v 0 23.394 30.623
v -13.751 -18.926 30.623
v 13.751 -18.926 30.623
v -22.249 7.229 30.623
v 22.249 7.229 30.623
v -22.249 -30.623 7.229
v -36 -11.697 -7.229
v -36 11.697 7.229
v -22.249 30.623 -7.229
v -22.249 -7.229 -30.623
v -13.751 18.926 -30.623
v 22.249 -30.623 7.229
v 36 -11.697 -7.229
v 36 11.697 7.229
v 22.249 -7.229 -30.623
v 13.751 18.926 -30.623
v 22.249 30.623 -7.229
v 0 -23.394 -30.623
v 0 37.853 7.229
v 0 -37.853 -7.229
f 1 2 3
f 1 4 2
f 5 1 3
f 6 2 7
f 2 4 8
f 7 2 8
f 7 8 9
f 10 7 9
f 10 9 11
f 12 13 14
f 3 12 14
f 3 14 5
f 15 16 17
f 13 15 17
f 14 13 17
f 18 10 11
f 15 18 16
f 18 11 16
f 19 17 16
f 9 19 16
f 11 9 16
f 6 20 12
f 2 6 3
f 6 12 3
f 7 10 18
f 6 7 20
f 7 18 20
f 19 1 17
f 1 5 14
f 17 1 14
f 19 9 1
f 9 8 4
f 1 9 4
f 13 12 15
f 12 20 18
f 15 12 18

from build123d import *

# Parameters (mm, degrees)
F1_DEPTH  = 30.6234291007
F13_DEPTH = 50
F14_DEPTH = 500
F15_DEPTH = 500
F16_DEPTH = 500
F17_DEPTH = 500
F24_DEPTH = 500
F25_DEPTH = 500
F26_DEPTH = 500
F27_DEPTH = 500
F28_DEPTH = 500


with BuildPart() as f1:
    # F0 (on Top) → F1 (new body, symmetric)
    with BuildSketch(Plane.XY):
        Polygon((-36, 11.6971090644), (-36, -11.6971090644), (-22.249223595, -30.6234291007), (0, -37.8526400726), (22.249223595, -30.6234291007), (36, -11.6971090644), (36, 11.6971090644), (22.249223595, 30.6234291007), (0, 37.8526400726), (-22.249223595, 30.6234291007), align=None)
    extrude(amount=F1_DEPTH, both=True)

    # F3 (on Right) → F13 (cut, symmetric)
    with BuildSketch(Plane.YZ):
        Polygon((-37.8526400726, -7.2292109719), (-18.9263200363, 30.6234291007), (-37.8526400726, 30.6234291007), align=None)
    extrude(amount=F13_DEPTH, both=True, mode=Mode.SUBTRACT)

    # F6 (on face) → F14 (cut, symmetric)
    with BuildSketch(Plane(origin=(0, 0, 0), x_dir=(-0.9510565163, 0.3090169944, 0), z_dir=(0.3090169944, 0.9510565163, 0))):
        Polygon((-37.8526400726, -7.2292109719), (-18.9263200363, 30.6234291007), (-37.8526400726, 30.6234291007), align=None)
    extrude(amount=F14_DEPTH, both=True, mode=Mode.SUBTRACT)

    # F8 (on face) → F15 (cut, symmetric)
    with BuildSketch(Plane(origin=(0, 0, 0), x_dir=(0.5877852523, 0.8090169944, 0), z_dir=(0.8090169944, -0.5877852523, 0))):
        Polygon((37.8526400726, -7.2292109719), (37.8526400726, 30.6234291007), (18.9263200363, 30.6234291007), align=None)
    extrude(amount=F15_DEPTH, both=True, mode=Mode.SUBTRACT)

    # F10 (on face) → F16 (cut, symmetric)
    with BuildSketch(Plane(origin=(0, 0, 0), x_dir=(0.5877852523, -0.8090169944, 0), z_dir=(-0.8090169944, -0.5877852523, 0))):
        Polygon((-18.9263200363, 30.6234291007), (-37.8526400726, 30.6234291007), (-37.8526400726, -7.2292109719), align=None)
    extrude(amount=F16_DEPTH, both=True, mode=Mode.SUBTRACT)

    # F12 (on face) → F17 (cut, symmetric)
    with BuildSketch(Plane(origin=(0, 0, 0), x_dir=(-0.9510565163, -0.3090169944, 0), z_dir=(-0.3090169944, 0.9510565163, 0))):
        Polygon((37.8526400726, 26.069773404), (37.8526400726, 30.6234291007), (18.9263200363, 30.6234291007), (37.8526400726, -7.2292109719), align=None)
    extrude(amount=F17_DEPTH, both=True, mode=Mode.SUBTRACT)

    # F19 (on Right) → F24 (cut, symmetric)
    with BuildSketch(Plane.YZ):
        Polygon((37.8526400726, 7.2292109719), (18.9263200363, -30.6234291007), (37.8526400726, -30.6234291007), align=None)
    extrude(amount=F24_DEPTH, both=True, mode=Mode.SUBTRACT)

    # F20 (on face) → F25 (cut, symmetric)
    with BuildSketch(Plane(origin=(0, 0, 0), x_dir=(-0.9510565163, -0.3090169944, 0), z_dir=(-0.3090169944, 0.9510565163, 0))):
        Polygon((-37.8526400726, -30.6234291007), (-18.9263200363, -30.6234291007), (-37.8526400726, 7.2292109719), align=None)
    extrude(amount=F25_DEPTH, both=True, mode=Mode.SUBTRACT)

    # F21 (on face) → F26 (cut, symmetric)
    with BuildSketch(Plane(origin=(0, 0, 0), x_dir=(0.5877852523, -0.8090169944, 0), z_dir=(-0.8090169944, -0.5877852523, 0))):
        Polygon((37.8526400726, 7.2292109719), (18.9263200363, -30.6234291007), (37.8526400726, -30.6234291007), align=None)
    extrude(amount=F26_DEPTH, both=True, mode=Mode.SUBTRACT)

    # F22 (on face) → F27 (cut, symmetric)
    with BuildSketch(Plane(origin=(0, 0, 0), x_dir=(0.5877852523, 0.8090169944, 0), z_dir=(0.8090169944, -0.5877852523, 0))):
        Polygon((-37.8526400726, -30.6234291007), (-18.9263200363, -30.6234291007), (-37.8526400726, 7.2292109719), align=None)
    extrude(amount=F27_DEPTH, both=True, mode=Mode.SUBTRACT)

    # F23 (on face) → F28 (cut, symmetric)
    with BuildSketch(Plane(origin=(0, 0, 0), x_dir=(-0.9510565163, 0.3090169944, 0), z_dir=(0.3090169944, 0.9510565163, 0))):
        Polygon((37.8526400726, 7.2292109719), (18.9263200363, -30.6234291007), (37.8526400726, -30.6234291007), align=None)
    extrude(amount=F28_DEPTH, both=True, mode=Mode.SUBTRACT)


solid = f1.part
